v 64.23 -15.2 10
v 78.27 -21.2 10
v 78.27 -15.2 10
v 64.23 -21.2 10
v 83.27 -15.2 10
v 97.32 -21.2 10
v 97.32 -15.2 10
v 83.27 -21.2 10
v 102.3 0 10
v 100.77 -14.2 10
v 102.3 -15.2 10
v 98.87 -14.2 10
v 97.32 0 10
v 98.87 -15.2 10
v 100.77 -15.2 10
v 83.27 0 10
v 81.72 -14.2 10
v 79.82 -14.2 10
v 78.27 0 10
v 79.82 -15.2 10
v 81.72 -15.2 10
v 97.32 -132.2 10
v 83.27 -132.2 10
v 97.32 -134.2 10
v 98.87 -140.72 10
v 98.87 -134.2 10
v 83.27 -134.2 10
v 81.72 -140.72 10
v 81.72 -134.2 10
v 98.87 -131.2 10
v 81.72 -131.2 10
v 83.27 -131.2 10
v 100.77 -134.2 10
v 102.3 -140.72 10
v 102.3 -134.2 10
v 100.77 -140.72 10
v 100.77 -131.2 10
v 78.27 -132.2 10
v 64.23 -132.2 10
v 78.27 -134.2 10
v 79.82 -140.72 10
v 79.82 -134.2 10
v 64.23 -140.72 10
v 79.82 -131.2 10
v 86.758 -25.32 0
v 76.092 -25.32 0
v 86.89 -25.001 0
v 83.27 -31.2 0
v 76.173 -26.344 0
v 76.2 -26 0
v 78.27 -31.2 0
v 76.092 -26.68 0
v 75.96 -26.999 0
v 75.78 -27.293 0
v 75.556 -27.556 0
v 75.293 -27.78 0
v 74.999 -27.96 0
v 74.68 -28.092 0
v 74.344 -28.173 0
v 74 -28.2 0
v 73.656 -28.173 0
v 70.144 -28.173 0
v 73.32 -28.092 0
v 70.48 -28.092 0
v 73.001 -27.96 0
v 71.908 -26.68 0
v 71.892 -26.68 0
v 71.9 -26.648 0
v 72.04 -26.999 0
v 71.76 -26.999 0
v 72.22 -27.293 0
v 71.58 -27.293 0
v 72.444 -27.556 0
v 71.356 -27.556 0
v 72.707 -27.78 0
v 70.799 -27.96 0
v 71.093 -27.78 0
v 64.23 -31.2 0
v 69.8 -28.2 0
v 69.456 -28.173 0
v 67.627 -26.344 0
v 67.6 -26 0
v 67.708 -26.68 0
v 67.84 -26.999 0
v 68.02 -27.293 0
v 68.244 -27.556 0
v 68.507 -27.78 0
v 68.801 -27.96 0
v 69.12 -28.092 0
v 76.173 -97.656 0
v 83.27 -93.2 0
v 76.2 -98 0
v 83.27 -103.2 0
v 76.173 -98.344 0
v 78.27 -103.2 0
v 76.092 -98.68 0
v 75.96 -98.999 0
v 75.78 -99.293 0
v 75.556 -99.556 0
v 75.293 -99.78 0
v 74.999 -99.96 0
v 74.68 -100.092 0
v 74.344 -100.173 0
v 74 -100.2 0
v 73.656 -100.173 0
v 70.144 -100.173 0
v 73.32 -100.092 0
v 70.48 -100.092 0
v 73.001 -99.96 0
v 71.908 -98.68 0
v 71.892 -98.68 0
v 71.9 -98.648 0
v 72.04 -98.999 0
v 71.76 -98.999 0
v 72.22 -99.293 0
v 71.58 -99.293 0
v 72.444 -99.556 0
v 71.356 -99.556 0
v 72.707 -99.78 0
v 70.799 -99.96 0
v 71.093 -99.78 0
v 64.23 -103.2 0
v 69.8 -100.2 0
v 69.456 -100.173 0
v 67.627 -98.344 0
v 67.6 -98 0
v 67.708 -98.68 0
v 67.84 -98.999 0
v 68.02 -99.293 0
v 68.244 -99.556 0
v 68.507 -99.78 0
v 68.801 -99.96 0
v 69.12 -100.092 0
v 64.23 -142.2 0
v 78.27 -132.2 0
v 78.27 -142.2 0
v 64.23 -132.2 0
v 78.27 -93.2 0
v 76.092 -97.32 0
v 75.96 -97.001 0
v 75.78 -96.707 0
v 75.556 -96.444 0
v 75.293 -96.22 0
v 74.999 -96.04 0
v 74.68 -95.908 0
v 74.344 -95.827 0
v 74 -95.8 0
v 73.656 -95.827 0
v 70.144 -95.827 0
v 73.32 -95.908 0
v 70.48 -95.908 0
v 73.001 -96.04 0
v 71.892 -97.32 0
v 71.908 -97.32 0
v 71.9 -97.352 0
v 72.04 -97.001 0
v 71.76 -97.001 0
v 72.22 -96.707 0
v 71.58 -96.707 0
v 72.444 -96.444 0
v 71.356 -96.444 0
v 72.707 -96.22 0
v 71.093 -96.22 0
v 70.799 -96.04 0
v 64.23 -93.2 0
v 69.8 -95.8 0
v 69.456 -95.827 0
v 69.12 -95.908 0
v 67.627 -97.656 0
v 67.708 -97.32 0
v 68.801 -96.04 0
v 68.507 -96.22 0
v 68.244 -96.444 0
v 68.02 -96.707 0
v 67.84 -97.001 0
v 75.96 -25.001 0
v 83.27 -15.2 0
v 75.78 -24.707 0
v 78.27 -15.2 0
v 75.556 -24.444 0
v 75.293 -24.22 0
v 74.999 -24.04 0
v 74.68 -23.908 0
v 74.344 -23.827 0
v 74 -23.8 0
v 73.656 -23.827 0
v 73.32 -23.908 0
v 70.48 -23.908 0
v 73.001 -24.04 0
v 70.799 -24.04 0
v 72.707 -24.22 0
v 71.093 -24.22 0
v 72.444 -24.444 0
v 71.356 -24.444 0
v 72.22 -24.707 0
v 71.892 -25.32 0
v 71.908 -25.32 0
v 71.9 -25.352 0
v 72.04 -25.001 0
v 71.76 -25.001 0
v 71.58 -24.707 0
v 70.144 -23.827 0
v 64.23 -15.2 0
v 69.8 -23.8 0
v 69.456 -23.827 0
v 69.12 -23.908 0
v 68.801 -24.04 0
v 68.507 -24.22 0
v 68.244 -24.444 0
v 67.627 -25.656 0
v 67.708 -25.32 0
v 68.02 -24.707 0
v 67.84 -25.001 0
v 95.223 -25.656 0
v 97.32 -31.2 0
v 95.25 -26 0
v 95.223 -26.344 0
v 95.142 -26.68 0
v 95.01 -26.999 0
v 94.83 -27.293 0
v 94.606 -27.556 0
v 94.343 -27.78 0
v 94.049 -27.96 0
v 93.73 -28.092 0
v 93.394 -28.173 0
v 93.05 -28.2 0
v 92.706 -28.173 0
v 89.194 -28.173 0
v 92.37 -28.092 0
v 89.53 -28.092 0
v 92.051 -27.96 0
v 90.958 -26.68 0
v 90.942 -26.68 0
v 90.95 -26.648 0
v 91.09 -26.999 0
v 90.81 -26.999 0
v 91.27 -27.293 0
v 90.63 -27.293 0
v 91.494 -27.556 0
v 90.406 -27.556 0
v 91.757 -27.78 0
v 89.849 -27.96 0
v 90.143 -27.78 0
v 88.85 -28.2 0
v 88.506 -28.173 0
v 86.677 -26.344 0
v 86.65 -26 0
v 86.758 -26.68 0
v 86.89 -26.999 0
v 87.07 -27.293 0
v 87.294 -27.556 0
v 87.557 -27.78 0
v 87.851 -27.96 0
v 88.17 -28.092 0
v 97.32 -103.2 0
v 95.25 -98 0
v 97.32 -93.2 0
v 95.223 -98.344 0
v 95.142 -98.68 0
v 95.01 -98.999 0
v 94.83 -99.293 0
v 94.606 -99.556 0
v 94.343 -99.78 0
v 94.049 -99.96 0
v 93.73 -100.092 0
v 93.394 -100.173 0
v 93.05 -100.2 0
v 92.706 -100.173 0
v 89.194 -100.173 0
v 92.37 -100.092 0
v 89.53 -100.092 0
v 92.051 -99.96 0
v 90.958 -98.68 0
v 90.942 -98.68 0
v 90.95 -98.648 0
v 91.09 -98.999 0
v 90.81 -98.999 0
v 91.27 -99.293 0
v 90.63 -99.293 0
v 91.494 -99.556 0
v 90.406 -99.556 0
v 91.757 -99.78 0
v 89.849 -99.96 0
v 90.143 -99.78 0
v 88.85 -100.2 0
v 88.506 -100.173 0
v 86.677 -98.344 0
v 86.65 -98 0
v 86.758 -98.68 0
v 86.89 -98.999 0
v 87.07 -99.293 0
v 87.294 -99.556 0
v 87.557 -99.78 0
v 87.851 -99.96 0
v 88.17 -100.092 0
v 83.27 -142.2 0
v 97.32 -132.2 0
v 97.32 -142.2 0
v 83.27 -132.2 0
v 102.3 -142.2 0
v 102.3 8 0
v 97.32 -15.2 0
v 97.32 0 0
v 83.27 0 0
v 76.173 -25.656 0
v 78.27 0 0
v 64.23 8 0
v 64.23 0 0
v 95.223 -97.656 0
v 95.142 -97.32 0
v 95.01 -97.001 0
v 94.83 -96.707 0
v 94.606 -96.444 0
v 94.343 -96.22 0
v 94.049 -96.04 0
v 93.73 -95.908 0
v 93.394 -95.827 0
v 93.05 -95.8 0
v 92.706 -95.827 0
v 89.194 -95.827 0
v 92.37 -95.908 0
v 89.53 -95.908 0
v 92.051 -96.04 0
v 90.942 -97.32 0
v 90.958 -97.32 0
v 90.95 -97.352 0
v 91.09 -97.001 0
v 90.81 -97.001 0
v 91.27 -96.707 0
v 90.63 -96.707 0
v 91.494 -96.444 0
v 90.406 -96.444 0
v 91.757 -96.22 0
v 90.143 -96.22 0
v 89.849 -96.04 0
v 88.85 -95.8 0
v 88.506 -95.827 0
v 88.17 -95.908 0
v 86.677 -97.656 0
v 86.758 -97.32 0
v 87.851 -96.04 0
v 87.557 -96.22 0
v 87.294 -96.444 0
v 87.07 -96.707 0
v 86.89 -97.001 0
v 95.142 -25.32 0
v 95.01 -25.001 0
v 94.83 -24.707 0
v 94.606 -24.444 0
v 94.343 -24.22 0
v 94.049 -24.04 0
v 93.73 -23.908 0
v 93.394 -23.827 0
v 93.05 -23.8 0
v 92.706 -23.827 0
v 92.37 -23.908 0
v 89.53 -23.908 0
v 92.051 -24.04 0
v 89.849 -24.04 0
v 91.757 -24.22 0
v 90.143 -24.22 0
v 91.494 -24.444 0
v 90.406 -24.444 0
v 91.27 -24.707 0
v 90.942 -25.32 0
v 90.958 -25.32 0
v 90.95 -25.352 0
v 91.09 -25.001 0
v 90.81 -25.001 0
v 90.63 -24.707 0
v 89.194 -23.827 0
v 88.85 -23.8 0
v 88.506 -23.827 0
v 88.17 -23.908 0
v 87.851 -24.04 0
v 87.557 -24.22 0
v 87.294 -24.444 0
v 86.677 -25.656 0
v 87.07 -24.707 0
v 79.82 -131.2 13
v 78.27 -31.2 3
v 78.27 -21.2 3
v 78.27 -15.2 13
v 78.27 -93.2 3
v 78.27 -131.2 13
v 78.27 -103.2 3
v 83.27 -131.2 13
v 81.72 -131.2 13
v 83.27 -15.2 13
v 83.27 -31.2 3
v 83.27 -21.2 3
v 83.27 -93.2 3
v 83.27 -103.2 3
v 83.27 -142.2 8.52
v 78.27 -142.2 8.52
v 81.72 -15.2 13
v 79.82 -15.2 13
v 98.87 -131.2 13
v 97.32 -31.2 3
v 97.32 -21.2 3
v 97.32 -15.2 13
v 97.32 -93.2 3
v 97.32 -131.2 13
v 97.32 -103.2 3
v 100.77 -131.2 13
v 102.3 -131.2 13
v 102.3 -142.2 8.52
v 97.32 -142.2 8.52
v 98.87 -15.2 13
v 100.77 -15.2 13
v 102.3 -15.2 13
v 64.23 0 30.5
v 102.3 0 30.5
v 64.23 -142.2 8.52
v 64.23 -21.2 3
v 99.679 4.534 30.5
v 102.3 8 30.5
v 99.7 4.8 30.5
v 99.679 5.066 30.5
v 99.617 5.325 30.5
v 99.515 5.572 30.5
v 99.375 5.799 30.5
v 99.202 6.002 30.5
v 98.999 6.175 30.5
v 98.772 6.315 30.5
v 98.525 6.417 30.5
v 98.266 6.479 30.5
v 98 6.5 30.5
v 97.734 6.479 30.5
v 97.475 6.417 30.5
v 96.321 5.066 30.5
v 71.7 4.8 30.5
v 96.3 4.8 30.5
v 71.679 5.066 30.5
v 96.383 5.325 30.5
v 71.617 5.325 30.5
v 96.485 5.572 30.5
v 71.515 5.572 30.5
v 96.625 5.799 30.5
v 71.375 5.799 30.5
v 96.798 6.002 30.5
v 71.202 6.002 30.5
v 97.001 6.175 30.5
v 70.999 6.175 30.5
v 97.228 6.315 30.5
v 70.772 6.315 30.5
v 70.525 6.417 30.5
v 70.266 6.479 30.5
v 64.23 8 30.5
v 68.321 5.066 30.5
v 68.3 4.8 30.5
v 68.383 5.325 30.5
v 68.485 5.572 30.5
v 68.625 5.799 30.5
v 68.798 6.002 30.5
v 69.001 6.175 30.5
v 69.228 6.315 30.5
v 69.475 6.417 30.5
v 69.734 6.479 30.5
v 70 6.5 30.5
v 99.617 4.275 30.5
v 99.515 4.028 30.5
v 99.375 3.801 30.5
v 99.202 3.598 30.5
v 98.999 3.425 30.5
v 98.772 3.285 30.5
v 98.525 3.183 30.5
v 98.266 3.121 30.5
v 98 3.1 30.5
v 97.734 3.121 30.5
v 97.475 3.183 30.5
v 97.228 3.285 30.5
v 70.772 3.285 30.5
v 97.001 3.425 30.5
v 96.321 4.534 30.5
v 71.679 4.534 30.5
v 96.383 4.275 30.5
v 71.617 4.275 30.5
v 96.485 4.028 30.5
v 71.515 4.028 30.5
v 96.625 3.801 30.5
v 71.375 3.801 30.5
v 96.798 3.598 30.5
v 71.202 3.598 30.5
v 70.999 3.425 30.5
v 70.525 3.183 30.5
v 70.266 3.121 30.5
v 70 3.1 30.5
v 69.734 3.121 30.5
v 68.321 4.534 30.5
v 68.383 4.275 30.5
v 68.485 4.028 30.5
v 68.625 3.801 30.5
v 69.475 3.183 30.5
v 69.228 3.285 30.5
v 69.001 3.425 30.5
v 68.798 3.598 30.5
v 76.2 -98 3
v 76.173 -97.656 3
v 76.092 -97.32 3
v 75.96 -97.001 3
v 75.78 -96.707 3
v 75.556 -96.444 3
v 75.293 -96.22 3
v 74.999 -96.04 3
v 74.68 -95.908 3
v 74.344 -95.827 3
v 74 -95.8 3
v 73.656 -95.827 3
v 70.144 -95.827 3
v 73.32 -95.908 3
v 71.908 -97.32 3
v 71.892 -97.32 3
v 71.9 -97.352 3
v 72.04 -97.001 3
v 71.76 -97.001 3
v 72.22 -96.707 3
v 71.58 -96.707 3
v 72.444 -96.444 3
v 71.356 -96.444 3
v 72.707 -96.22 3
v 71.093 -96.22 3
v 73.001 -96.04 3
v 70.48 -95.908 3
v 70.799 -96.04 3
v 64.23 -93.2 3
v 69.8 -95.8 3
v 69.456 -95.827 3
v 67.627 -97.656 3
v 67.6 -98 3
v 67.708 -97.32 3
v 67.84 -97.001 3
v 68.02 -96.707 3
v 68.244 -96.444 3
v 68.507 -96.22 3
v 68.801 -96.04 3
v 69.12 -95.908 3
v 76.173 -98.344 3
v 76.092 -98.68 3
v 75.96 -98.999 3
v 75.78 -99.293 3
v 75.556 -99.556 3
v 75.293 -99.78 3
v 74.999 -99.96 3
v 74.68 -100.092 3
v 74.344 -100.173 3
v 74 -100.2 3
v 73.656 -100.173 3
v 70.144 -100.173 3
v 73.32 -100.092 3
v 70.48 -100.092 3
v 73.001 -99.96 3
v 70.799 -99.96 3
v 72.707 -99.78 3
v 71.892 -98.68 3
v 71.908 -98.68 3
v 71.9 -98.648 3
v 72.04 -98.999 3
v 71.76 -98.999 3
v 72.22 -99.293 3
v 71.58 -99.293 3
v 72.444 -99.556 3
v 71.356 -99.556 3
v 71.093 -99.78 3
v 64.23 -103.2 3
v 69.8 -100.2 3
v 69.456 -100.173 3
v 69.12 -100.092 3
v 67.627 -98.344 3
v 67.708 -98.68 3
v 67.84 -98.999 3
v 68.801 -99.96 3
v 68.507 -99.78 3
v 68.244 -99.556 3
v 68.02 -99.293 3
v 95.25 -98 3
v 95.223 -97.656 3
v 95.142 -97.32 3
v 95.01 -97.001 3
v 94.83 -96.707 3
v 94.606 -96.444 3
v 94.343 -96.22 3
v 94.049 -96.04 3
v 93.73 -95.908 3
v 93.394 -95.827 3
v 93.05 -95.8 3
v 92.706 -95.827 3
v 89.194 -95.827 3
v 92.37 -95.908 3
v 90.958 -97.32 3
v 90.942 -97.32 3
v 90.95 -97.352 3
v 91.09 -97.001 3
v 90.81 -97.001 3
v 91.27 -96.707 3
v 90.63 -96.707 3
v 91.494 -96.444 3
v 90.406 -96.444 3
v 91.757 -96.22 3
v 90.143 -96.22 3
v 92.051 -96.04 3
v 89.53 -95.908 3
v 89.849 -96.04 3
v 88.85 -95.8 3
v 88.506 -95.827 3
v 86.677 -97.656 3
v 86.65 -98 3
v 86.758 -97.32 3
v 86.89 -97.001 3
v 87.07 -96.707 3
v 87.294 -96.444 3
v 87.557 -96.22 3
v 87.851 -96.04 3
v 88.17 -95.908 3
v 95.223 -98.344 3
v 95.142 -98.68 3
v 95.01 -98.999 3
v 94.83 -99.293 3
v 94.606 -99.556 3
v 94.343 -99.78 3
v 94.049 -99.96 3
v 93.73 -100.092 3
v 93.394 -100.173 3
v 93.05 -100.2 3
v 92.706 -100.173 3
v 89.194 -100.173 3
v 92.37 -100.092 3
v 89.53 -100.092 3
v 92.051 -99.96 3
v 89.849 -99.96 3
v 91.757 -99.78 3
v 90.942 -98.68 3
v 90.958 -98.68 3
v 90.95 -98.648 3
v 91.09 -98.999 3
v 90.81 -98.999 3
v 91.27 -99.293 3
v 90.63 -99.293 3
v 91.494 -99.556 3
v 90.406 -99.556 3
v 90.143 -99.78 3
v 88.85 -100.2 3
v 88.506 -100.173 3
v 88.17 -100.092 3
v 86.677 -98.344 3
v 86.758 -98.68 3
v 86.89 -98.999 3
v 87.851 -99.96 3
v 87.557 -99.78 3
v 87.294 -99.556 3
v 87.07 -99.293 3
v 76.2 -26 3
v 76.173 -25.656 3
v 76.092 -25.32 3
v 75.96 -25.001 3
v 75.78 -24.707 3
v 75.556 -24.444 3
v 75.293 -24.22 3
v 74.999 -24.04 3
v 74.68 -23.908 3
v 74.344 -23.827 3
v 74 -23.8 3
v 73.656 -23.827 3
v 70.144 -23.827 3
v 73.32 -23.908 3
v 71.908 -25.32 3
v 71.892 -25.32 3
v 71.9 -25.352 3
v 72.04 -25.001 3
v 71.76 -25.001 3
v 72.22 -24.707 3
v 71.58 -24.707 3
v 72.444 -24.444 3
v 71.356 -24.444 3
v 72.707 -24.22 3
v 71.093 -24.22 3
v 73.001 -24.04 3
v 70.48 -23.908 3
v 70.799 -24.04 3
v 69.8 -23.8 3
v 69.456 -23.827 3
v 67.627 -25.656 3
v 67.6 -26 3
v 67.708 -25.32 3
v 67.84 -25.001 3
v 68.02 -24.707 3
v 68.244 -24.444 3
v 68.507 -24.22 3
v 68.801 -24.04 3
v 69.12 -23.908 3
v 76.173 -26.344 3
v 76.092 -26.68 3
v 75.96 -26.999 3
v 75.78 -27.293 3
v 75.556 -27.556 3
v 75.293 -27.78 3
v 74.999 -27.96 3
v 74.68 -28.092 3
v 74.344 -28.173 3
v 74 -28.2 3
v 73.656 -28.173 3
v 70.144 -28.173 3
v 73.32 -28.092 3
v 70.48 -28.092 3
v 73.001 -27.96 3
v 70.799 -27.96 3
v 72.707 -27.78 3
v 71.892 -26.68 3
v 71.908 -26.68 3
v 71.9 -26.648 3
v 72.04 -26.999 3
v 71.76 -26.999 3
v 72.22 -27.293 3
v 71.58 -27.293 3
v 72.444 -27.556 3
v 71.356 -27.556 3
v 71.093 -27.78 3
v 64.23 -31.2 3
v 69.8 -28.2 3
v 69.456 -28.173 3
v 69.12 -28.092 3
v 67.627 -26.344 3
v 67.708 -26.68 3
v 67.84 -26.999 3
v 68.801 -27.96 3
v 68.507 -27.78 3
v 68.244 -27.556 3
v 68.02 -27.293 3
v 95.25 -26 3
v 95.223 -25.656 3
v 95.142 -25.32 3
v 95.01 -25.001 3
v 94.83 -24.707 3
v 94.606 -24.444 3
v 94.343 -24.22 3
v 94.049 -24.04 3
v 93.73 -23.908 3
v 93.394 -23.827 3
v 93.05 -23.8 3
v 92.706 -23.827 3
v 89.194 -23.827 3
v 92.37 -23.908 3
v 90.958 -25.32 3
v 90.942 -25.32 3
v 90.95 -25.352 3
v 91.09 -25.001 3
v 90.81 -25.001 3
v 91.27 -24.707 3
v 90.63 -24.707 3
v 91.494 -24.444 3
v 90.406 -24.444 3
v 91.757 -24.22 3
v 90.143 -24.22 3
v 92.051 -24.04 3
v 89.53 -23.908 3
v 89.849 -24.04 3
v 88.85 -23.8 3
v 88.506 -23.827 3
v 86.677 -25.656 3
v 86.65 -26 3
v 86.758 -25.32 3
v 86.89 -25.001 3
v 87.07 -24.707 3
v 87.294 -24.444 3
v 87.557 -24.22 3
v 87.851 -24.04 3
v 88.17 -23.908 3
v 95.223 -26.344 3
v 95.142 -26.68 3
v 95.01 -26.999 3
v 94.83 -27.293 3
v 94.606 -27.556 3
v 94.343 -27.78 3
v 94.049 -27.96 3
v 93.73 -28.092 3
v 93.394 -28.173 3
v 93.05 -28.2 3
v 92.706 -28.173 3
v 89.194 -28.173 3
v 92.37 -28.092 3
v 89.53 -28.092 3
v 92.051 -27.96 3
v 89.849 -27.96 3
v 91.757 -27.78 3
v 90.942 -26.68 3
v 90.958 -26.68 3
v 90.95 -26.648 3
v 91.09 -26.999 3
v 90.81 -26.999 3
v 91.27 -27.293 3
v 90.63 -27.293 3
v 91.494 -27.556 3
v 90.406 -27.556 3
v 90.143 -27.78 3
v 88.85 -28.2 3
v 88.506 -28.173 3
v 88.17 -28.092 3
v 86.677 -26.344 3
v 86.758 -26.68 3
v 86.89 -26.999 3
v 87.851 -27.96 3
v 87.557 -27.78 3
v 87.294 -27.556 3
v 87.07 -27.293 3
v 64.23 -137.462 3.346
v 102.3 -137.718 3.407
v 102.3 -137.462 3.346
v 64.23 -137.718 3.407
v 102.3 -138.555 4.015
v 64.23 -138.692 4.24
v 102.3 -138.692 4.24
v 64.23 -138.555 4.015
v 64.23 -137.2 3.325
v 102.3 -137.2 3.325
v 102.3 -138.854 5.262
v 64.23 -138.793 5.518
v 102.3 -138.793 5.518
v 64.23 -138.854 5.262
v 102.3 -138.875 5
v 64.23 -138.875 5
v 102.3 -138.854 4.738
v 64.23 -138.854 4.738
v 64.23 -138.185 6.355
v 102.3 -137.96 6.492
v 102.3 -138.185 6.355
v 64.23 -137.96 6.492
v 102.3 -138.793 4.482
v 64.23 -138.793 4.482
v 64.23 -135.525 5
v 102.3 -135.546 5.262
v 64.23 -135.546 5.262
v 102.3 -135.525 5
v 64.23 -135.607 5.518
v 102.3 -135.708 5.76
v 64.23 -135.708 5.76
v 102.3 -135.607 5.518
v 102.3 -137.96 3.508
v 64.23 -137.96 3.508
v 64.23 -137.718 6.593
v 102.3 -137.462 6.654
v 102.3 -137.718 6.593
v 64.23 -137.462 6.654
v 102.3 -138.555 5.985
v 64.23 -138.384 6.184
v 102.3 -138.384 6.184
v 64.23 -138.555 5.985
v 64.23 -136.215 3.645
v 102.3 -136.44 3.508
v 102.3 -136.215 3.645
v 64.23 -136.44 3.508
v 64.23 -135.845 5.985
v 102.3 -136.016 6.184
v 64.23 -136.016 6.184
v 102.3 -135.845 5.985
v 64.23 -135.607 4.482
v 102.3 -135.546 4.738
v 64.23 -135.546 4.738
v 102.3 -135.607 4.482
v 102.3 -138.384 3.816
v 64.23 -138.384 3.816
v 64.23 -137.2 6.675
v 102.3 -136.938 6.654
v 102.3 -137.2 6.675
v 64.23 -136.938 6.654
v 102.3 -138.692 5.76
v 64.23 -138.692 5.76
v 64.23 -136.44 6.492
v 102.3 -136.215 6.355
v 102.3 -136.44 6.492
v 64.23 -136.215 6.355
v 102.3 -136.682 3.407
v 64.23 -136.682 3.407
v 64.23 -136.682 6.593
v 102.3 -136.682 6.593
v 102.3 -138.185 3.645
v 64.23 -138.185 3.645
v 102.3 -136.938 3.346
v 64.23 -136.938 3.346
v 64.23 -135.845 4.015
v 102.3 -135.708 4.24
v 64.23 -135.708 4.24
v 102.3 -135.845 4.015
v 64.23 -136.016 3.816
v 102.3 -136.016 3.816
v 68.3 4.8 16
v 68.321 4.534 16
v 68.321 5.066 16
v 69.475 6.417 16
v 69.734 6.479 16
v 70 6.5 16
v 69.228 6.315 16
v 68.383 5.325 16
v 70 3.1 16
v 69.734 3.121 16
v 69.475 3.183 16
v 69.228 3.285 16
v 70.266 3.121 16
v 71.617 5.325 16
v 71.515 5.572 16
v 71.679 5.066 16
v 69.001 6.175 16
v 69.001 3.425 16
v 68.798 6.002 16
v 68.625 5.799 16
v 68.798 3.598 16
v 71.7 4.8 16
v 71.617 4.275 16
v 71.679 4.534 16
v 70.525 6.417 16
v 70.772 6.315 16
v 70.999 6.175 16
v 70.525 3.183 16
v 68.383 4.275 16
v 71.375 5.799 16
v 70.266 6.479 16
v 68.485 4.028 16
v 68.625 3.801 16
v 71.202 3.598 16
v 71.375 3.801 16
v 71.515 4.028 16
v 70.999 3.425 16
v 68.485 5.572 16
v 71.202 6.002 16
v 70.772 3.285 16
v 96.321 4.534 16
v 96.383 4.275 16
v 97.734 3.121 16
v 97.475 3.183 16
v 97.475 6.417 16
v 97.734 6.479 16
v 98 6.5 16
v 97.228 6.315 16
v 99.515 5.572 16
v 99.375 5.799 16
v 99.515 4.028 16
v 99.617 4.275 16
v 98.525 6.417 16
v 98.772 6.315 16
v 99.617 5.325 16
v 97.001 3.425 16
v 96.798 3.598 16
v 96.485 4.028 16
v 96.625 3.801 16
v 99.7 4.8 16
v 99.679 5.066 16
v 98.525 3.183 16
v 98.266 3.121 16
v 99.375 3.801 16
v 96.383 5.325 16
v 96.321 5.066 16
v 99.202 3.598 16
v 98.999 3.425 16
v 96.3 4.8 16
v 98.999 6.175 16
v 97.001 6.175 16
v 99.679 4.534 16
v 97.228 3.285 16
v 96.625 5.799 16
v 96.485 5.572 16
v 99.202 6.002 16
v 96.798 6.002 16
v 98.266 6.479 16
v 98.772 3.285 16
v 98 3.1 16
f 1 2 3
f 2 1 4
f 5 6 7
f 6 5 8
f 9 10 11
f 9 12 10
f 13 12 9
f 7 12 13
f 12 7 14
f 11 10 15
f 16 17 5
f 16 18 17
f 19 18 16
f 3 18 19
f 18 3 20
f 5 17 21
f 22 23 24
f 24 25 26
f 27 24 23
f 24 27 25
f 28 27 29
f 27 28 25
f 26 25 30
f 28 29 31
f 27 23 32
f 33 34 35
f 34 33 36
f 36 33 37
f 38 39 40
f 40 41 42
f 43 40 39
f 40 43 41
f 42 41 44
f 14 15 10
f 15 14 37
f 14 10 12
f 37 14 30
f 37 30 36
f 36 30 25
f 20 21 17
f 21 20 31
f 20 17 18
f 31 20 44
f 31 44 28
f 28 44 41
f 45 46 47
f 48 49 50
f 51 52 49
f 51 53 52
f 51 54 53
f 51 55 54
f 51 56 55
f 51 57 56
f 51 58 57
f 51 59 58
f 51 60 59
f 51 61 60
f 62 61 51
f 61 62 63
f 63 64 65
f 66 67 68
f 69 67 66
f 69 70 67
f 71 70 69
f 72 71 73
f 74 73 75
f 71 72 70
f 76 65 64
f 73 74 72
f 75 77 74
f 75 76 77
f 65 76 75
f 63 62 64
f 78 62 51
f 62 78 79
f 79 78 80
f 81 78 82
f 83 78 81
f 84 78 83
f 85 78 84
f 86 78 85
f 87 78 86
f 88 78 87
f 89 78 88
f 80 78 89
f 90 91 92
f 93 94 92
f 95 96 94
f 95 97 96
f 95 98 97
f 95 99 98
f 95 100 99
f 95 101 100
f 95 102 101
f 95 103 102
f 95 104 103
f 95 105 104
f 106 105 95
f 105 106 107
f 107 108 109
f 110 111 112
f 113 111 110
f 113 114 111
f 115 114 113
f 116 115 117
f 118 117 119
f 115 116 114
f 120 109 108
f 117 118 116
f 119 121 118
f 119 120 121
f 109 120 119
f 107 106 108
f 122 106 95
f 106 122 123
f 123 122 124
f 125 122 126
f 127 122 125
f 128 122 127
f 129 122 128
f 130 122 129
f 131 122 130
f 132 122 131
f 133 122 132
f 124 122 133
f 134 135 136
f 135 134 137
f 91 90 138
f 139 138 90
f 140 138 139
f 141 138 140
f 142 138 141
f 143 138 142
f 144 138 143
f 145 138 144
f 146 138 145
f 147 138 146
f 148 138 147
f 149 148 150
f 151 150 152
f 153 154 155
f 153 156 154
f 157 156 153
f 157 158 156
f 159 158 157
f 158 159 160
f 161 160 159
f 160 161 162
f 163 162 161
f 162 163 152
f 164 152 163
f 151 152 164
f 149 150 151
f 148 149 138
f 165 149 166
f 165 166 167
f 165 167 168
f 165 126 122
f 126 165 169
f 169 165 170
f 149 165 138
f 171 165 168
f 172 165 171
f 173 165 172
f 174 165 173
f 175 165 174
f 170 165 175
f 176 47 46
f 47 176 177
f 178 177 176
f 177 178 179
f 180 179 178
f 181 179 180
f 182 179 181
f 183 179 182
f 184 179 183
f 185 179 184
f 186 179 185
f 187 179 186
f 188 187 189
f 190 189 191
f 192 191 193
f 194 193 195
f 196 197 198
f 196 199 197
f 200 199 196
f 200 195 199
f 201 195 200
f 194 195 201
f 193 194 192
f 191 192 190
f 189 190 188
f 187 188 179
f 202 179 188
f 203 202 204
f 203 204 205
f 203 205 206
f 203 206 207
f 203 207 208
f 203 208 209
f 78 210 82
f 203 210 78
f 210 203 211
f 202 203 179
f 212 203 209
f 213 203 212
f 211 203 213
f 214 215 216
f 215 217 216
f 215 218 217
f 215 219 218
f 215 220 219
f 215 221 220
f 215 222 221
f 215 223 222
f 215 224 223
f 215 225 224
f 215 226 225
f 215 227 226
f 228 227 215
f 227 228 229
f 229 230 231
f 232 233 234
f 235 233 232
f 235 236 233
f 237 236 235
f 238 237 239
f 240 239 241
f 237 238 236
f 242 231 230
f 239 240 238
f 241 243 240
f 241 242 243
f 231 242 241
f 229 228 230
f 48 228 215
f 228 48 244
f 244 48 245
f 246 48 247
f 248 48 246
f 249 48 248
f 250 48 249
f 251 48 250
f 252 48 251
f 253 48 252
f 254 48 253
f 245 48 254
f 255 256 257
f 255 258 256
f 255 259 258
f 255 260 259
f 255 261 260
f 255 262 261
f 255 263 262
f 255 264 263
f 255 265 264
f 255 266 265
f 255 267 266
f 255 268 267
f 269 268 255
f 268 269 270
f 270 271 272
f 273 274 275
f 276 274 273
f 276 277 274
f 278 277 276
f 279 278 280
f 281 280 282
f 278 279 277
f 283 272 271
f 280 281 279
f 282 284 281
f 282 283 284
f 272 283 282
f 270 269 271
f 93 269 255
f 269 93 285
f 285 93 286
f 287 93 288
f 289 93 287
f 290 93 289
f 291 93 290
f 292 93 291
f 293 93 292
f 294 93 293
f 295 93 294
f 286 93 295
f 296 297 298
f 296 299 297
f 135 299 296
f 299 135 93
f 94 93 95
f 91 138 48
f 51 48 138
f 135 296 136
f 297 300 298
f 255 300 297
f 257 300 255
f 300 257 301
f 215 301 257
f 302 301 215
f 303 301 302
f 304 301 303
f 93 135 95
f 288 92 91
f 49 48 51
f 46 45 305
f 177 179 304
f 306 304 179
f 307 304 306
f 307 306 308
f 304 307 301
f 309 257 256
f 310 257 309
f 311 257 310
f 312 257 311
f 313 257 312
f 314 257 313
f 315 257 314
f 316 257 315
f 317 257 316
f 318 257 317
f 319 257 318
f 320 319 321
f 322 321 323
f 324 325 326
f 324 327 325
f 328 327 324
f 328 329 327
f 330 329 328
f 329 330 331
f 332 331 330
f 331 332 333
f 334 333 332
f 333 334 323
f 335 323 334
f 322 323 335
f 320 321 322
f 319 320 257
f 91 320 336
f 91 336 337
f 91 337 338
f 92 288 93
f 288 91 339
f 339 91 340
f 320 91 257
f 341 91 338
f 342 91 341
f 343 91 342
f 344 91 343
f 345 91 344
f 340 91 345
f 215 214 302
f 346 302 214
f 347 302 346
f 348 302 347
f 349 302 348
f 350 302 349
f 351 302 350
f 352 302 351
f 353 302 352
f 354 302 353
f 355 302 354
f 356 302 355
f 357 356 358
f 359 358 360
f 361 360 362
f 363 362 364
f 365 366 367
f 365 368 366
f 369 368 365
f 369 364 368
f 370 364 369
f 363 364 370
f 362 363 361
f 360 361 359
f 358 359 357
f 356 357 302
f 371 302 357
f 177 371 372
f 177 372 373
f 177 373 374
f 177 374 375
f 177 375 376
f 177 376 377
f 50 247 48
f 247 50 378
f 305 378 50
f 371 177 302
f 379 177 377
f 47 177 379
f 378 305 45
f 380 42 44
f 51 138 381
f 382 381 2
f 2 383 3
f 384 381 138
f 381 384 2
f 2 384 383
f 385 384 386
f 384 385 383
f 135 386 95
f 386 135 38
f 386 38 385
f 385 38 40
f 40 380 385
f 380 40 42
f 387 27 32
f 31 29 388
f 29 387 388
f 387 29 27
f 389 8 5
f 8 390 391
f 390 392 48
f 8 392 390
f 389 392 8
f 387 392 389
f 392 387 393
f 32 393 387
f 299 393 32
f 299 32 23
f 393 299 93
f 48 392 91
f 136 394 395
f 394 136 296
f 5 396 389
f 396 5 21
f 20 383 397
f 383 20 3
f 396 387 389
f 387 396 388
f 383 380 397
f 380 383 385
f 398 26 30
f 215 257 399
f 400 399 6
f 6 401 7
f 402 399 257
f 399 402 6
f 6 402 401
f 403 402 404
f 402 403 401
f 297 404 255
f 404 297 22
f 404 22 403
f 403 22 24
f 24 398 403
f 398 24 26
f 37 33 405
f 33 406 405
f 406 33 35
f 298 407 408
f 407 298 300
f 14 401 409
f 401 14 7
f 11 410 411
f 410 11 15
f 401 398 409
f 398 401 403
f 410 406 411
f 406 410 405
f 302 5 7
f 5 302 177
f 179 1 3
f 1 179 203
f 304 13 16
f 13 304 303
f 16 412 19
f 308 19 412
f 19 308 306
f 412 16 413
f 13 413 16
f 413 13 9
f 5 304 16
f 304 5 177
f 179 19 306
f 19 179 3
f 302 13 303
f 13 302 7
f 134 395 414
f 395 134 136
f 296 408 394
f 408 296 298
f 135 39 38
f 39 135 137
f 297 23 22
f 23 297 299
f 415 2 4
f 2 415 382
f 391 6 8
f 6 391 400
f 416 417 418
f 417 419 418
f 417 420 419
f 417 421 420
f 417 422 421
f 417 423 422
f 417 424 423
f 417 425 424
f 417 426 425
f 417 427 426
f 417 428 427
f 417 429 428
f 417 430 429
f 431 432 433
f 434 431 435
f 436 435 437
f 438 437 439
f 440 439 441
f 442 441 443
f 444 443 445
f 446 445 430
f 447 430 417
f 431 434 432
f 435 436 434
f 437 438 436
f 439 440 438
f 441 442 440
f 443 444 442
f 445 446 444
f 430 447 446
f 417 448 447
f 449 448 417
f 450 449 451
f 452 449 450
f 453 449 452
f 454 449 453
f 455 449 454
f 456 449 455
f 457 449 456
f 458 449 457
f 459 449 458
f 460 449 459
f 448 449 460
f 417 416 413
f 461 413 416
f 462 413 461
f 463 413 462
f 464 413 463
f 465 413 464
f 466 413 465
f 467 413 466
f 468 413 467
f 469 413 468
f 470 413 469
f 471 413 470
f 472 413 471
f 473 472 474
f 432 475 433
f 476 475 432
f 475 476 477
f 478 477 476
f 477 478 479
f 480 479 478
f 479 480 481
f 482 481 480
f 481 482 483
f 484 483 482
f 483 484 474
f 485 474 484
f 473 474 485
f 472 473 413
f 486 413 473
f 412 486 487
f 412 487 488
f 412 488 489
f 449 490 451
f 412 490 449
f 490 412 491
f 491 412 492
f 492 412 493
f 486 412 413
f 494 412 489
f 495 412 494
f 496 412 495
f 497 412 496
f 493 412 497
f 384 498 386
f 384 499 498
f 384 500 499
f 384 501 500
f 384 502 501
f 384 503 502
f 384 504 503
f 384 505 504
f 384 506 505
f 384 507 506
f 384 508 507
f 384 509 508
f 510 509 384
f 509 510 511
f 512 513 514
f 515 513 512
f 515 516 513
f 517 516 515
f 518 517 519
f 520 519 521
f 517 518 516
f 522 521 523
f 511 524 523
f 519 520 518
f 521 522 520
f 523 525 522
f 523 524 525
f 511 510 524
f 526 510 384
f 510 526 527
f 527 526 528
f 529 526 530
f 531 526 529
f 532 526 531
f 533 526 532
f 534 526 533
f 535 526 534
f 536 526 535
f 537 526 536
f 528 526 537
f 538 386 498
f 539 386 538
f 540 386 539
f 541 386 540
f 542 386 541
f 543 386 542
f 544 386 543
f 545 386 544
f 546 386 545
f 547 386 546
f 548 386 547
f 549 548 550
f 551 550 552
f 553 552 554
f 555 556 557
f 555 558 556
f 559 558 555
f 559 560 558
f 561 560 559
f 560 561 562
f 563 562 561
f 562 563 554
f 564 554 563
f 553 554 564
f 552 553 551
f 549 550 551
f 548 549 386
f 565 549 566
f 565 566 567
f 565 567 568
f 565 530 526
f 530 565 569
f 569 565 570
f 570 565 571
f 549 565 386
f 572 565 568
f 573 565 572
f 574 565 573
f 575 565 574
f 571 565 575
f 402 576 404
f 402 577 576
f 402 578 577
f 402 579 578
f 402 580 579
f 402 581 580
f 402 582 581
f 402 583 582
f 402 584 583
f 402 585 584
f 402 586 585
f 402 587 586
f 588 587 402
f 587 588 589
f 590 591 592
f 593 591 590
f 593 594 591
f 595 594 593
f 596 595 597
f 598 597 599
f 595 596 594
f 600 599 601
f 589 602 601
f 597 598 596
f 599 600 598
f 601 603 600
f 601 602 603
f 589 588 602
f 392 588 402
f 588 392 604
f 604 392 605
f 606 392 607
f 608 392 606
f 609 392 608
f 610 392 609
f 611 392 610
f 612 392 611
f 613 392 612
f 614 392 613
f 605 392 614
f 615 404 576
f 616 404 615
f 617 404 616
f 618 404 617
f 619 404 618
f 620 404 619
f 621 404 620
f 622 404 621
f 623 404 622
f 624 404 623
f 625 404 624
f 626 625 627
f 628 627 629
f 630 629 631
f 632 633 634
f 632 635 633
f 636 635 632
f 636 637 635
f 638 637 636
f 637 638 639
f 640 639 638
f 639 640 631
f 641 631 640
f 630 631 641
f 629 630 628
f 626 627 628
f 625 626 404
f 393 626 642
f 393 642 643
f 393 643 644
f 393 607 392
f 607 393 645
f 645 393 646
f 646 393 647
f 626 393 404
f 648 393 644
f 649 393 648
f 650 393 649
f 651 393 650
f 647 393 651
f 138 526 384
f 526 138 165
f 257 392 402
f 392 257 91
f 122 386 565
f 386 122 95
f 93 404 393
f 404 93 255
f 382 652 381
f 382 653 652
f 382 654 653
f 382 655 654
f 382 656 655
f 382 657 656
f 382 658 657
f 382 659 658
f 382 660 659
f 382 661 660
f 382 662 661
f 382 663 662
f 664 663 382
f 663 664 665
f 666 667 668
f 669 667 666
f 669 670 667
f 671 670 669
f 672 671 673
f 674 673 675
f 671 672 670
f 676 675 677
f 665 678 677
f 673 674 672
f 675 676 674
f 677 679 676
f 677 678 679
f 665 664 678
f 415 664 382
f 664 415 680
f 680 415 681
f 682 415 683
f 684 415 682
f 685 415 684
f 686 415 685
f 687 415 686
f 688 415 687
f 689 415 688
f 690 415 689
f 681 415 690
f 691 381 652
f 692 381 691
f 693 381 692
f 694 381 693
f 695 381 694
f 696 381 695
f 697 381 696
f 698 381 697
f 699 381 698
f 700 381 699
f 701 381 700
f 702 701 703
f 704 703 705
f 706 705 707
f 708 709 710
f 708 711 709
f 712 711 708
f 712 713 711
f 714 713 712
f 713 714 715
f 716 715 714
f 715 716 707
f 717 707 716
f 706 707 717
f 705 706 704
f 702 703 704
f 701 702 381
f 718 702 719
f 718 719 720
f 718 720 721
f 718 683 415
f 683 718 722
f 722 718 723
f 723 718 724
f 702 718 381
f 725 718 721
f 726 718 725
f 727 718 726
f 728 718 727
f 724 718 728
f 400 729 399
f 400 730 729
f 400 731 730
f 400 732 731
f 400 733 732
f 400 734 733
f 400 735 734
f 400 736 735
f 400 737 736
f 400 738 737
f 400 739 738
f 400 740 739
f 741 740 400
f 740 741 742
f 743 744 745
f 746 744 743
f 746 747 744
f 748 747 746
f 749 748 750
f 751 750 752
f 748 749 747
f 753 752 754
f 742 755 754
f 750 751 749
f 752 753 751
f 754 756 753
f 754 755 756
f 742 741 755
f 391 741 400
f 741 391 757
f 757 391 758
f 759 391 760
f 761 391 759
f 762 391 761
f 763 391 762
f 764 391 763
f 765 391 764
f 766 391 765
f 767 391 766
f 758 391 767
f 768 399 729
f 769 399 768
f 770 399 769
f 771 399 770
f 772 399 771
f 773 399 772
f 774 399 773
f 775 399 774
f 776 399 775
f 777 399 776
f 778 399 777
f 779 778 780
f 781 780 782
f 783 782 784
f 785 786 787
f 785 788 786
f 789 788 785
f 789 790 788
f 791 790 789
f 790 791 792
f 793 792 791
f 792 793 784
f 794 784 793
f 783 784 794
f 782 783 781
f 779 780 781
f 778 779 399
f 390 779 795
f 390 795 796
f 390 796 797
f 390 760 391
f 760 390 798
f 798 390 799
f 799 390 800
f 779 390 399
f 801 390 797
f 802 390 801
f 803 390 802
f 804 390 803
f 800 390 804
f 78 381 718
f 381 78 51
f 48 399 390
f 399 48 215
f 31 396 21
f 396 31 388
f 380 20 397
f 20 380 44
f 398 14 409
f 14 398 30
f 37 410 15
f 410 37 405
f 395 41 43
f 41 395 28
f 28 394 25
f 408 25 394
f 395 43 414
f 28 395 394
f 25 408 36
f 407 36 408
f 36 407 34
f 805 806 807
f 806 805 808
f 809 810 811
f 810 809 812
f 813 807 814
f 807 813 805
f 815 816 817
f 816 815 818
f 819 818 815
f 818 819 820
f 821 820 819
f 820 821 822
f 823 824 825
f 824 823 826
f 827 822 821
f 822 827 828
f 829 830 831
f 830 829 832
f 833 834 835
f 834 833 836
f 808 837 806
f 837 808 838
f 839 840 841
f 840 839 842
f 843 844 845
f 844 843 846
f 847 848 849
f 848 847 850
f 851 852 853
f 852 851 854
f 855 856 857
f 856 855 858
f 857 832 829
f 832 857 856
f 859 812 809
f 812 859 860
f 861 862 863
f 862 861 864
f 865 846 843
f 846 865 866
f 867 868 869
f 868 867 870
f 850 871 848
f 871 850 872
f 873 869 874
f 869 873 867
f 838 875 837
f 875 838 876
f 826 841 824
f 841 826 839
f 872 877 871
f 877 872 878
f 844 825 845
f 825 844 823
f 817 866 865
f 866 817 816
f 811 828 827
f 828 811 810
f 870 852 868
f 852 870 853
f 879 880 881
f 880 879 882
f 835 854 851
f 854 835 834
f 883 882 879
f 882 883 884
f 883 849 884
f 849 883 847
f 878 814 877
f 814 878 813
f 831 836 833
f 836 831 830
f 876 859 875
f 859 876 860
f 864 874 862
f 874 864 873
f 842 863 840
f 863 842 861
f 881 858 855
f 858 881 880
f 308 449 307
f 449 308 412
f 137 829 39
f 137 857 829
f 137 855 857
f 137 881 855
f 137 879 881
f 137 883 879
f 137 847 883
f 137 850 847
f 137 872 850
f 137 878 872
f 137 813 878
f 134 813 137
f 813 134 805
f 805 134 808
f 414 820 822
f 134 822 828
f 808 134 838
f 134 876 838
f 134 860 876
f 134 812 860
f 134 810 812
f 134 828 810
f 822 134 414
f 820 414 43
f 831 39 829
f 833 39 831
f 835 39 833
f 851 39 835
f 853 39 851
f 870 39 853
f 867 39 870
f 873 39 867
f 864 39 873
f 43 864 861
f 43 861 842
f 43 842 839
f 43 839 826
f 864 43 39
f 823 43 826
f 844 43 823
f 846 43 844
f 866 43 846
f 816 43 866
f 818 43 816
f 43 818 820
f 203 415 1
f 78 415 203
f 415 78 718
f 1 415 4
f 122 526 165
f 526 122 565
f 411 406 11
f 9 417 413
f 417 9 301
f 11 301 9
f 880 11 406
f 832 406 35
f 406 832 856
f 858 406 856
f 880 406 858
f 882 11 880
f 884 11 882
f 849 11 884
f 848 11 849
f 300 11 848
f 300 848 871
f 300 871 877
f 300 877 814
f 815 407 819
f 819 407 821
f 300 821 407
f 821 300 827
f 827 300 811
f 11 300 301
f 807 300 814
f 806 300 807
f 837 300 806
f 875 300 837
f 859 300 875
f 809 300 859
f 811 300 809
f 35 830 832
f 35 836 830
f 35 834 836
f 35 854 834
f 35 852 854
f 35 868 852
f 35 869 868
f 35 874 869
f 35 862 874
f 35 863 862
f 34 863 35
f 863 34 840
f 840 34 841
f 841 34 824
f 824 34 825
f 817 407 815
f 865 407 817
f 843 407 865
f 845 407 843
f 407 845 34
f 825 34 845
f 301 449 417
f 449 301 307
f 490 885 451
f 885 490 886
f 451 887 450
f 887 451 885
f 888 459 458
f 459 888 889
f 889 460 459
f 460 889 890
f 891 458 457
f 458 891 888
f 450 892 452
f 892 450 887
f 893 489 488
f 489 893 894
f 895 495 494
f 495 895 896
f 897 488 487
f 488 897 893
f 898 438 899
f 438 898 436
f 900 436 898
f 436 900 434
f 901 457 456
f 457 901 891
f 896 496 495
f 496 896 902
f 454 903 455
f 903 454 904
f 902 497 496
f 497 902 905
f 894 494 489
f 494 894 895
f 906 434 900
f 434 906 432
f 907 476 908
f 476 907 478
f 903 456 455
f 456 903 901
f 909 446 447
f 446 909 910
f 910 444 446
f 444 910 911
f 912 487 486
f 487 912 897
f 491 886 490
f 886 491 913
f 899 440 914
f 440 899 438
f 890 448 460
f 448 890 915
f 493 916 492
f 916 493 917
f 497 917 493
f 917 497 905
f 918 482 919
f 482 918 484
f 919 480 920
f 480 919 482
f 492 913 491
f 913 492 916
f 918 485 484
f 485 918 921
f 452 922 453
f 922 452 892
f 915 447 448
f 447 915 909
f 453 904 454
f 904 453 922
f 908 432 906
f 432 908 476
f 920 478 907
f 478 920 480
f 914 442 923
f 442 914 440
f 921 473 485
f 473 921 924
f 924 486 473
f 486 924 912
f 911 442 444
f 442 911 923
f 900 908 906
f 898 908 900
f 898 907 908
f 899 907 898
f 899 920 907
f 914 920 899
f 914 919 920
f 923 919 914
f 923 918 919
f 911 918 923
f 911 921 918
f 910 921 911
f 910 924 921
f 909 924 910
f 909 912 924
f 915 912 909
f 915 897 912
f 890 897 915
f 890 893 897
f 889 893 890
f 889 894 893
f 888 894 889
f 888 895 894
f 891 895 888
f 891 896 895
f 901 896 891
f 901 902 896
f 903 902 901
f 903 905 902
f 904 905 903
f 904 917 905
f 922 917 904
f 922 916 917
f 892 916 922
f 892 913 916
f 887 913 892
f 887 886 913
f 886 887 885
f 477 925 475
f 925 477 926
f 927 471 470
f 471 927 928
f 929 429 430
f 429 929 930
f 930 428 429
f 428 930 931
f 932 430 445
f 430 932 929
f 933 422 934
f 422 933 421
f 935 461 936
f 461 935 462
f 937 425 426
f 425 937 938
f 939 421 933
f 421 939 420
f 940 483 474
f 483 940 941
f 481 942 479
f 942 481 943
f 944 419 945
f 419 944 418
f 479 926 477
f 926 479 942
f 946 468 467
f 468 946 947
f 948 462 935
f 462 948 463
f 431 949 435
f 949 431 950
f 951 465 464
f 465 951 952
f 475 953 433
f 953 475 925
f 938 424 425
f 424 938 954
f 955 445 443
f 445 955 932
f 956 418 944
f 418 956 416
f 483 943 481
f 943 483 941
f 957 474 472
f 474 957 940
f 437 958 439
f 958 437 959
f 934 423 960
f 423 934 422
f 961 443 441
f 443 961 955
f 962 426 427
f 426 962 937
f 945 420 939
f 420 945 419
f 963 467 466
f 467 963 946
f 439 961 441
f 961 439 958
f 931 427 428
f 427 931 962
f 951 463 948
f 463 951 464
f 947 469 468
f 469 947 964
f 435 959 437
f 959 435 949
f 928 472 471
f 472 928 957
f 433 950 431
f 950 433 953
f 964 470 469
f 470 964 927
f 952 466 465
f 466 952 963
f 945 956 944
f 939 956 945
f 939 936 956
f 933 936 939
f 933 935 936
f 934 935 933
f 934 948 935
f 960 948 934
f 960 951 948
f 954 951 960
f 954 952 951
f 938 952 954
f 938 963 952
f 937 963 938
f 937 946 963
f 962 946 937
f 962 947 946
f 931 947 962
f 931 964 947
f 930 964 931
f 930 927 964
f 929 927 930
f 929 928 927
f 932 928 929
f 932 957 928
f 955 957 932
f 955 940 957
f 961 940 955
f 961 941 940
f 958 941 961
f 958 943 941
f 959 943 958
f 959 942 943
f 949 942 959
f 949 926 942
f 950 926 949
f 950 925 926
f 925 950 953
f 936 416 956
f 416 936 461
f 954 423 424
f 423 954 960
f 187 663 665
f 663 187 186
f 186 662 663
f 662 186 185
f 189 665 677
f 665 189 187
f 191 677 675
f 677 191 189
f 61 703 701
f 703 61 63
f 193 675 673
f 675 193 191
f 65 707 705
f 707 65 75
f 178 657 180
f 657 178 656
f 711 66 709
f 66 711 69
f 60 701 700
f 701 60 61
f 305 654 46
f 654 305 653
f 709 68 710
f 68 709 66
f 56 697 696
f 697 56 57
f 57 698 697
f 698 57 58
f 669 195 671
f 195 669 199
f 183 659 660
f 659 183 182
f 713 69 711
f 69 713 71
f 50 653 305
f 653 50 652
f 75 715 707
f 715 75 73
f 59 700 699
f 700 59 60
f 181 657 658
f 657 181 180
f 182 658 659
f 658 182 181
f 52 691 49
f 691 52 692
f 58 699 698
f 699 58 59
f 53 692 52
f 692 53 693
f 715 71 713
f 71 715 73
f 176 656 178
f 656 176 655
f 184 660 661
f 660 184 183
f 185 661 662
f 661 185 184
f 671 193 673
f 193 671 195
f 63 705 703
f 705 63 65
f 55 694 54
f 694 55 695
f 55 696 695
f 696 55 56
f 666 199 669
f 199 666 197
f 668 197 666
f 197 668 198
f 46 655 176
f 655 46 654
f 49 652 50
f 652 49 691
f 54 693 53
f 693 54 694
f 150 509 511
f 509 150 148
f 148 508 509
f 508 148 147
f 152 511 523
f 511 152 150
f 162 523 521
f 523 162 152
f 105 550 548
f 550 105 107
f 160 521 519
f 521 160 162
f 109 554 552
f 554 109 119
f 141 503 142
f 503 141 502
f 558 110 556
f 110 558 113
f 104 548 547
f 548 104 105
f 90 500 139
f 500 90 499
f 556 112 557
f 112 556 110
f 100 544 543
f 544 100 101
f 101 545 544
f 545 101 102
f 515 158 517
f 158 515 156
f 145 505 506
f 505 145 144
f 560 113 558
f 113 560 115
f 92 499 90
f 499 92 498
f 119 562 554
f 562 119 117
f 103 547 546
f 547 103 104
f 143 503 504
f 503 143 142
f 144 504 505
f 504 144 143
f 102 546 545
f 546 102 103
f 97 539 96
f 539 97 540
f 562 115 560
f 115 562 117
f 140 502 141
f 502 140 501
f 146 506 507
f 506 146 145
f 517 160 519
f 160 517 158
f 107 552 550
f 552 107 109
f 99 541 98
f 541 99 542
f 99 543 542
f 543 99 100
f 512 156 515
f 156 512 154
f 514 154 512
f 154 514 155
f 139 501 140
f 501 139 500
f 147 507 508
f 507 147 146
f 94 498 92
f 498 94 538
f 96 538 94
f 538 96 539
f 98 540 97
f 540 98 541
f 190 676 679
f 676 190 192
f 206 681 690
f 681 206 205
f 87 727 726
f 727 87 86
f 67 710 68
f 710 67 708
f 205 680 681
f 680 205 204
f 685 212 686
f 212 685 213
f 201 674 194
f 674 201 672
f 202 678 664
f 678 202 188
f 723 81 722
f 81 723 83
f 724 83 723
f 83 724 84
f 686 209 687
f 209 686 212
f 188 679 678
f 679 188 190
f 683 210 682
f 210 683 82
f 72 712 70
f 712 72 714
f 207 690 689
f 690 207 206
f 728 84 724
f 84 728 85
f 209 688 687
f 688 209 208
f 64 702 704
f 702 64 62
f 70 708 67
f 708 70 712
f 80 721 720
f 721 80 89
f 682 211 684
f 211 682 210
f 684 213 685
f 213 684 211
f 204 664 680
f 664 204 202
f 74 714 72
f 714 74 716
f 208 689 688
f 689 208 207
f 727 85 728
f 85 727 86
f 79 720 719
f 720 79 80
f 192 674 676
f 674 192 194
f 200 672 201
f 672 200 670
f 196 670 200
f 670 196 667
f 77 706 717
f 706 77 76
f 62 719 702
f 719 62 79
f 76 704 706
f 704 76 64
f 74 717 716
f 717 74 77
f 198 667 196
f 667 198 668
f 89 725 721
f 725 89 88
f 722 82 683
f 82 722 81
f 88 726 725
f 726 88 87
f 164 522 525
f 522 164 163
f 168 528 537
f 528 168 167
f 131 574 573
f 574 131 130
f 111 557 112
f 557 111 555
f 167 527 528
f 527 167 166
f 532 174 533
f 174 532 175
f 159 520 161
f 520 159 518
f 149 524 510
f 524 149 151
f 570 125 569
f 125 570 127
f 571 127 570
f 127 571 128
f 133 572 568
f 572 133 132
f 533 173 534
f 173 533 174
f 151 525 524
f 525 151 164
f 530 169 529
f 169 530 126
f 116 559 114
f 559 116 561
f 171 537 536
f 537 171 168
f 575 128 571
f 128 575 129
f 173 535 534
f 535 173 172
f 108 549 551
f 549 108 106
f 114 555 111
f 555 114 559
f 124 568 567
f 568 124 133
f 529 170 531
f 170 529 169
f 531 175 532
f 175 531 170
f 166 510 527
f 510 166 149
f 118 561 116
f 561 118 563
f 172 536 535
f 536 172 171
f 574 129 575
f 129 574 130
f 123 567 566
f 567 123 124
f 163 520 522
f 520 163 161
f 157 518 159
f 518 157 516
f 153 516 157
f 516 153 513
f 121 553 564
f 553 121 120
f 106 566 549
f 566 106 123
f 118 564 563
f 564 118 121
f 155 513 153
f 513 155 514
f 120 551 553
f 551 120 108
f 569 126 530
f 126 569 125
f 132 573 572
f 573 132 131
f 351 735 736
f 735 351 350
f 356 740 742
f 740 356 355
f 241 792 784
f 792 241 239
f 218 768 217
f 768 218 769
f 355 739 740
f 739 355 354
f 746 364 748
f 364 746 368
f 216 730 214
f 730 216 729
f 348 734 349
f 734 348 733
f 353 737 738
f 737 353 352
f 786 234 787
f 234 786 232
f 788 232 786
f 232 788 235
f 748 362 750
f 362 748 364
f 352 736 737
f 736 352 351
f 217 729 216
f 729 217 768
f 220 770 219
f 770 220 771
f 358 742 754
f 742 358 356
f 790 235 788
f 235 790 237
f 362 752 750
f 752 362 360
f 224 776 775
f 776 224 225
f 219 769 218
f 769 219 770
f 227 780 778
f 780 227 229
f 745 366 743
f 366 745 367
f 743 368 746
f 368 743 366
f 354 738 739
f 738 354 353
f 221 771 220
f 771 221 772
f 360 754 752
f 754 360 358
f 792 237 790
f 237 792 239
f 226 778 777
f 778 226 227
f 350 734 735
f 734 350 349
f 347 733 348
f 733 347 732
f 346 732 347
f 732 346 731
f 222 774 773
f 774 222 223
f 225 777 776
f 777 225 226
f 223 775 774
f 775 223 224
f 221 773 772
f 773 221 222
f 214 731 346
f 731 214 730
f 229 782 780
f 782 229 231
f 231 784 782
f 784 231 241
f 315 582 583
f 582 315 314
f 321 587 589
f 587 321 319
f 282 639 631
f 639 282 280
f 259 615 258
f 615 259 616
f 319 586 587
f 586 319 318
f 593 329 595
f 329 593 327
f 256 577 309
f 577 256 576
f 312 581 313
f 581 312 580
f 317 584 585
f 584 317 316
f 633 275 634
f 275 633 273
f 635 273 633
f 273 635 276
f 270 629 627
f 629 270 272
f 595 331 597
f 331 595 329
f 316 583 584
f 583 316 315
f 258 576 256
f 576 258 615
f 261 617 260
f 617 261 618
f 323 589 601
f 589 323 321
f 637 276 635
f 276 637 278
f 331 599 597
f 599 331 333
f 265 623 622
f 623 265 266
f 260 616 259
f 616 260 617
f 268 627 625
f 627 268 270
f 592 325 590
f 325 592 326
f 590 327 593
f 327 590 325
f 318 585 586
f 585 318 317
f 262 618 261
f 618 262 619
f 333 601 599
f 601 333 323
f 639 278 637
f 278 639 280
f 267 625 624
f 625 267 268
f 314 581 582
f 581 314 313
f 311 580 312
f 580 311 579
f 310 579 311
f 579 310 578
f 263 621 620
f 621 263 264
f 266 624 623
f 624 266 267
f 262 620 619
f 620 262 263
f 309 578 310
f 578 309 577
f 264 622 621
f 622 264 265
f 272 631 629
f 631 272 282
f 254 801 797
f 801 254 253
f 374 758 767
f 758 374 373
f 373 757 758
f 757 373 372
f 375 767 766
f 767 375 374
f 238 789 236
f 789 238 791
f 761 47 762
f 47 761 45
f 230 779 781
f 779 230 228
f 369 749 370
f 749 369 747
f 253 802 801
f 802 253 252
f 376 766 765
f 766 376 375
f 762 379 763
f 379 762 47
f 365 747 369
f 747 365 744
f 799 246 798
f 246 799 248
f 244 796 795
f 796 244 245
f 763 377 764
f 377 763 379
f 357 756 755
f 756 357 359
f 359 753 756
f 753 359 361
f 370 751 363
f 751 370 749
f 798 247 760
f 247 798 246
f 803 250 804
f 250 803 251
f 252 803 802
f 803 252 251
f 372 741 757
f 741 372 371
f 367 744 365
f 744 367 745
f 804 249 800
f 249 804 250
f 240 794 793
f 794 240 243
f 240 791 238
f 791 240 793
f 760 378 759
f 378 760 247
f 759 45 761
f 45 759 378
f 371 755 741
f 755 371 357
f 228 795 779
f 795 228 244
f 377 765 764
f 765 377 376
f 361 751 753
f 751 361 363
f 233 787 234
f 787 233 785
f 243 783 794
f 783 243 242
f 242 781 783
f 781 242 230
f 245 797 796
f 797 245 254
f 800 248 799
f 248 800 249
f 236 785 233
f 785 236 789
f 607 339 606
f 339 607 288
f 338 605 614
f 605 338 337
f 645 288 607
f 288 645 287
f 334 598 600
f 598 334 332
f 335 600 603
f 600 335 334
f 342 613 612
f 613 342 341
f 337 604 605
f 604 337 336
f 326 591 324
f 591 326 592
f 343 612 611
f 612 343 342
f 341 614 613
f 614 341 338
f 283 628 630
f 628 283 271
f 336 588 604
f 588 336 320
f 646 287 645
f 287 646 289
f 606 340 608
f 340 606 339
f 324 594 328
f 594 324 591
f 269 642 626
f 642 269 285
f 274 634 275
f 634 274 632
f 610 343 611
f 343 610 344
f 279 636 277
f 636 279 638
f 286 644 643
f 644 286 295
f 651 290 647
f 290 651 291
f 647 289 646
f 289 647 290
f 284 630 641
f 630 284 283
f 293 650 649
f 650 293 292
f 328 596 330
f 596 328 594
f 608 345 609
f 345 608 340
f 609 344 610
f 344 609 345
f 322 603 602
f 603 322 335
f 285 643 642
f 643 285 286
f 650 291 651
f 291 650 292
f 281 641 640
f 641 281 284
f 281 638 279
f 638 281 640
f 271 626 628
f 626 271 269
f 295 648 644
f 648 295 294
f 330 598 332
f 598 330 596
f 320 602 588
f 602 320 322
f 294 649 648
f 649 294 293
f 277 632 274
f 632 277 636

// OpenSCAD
// This is the top side with card guides.
// Orientation:
// x = 0 : left edge of backplane PCB
// y = 0 : top of backplane
// z = 0 : outermost surface of card guide

include <s100_defs18-2c.scad>

$fn = 40;

lip_to_mod = mod_width/2 + mod_ofs - ((bp_hole_row3 - bp_hole_row2)/2 + bp_hole_row2) - edge[3];
lip_z = lip_to_mod + cg_slot_gap + cg_depth;
screw_cb = lip_z - attach_thick;

echo(lip_to_mod);


difference(){
  // Additions (guides, frame, lip, etc)
  union(){
    base_lip(lip_z, 1);
    card_guides(1);
    add_frame(lip_z, 1);
    translate ([0,-103.2,0]) cube([200,10,3]);
    translate ([0,-31.2,0]) cube([200,10,3]);
  }
  
  // Removals (holes + slot cutouts) //19.05
  //translate ([0,-1.5,0]) mtg_holes(1);
  card_slots(1);
  attach_holes(1); 
  attach_cutout(1);
  support_holes(screw_threads, -1);
  top_chamfer(1);
  //cutout delantero
  translate([-34.04,-150,-10]) cube(size=[98.27,280,50]); //0.5 recortado de -53.1
  //cutout trasero
  translate([102.3,-150,-10]) cube(size=[118,280,50]);  //101.8 o 102.3
  translate ([-20,+16,-10]) rotate([90,0,0]) cube([190.5+40, 216+40, 9-1]); 
  //#cube([190.5+20, 216+20, 9-6]);  
  translate ([70,4.8,16]) rotate([0,0,90]) cylinder(h=15, d=3.4, center=false);
  translate ([98,4.8,16]) rotate([0,0,90]) cylinder(h=15, d=3.4, center=false);

  translate ([74,-26,-2]) rotate([0,0,90]) cylinder(h=15, d=4.4, center=false);
  translate ([74,-26-72,-2]) rotate([0,0,90]) cylinder(h=15, d=4.4, center=false);
  translate ([74-4.2,-26,-2]) rotate([0,0,90]) cylinder(h=15, d=4.4, center=false);
  translate ([74-4.2,-26-72,-2]) rotate([0,0,90]) cylinder(h=15, d=4.4, center=false);

  translate ([74+19.05,-26,-2]) rotate([0,0,90]) cylinder(h=15, d=4.4, center=false);
  translate ([74+19.05,-26-72,-2]) rotate([0,0,90]) cylinder(h=15, d=4.4, center=false);
  translate ([74-4.2+19.05,-26,-2]) rotate([0,0,90]) cylinder(h=15, d=4.4, center=false);
  translate ([74-4.2+19.05,-26-72,-2]) rotate([0,0,90]) cylinder(h=15, d=4.4, center=false);
  }
